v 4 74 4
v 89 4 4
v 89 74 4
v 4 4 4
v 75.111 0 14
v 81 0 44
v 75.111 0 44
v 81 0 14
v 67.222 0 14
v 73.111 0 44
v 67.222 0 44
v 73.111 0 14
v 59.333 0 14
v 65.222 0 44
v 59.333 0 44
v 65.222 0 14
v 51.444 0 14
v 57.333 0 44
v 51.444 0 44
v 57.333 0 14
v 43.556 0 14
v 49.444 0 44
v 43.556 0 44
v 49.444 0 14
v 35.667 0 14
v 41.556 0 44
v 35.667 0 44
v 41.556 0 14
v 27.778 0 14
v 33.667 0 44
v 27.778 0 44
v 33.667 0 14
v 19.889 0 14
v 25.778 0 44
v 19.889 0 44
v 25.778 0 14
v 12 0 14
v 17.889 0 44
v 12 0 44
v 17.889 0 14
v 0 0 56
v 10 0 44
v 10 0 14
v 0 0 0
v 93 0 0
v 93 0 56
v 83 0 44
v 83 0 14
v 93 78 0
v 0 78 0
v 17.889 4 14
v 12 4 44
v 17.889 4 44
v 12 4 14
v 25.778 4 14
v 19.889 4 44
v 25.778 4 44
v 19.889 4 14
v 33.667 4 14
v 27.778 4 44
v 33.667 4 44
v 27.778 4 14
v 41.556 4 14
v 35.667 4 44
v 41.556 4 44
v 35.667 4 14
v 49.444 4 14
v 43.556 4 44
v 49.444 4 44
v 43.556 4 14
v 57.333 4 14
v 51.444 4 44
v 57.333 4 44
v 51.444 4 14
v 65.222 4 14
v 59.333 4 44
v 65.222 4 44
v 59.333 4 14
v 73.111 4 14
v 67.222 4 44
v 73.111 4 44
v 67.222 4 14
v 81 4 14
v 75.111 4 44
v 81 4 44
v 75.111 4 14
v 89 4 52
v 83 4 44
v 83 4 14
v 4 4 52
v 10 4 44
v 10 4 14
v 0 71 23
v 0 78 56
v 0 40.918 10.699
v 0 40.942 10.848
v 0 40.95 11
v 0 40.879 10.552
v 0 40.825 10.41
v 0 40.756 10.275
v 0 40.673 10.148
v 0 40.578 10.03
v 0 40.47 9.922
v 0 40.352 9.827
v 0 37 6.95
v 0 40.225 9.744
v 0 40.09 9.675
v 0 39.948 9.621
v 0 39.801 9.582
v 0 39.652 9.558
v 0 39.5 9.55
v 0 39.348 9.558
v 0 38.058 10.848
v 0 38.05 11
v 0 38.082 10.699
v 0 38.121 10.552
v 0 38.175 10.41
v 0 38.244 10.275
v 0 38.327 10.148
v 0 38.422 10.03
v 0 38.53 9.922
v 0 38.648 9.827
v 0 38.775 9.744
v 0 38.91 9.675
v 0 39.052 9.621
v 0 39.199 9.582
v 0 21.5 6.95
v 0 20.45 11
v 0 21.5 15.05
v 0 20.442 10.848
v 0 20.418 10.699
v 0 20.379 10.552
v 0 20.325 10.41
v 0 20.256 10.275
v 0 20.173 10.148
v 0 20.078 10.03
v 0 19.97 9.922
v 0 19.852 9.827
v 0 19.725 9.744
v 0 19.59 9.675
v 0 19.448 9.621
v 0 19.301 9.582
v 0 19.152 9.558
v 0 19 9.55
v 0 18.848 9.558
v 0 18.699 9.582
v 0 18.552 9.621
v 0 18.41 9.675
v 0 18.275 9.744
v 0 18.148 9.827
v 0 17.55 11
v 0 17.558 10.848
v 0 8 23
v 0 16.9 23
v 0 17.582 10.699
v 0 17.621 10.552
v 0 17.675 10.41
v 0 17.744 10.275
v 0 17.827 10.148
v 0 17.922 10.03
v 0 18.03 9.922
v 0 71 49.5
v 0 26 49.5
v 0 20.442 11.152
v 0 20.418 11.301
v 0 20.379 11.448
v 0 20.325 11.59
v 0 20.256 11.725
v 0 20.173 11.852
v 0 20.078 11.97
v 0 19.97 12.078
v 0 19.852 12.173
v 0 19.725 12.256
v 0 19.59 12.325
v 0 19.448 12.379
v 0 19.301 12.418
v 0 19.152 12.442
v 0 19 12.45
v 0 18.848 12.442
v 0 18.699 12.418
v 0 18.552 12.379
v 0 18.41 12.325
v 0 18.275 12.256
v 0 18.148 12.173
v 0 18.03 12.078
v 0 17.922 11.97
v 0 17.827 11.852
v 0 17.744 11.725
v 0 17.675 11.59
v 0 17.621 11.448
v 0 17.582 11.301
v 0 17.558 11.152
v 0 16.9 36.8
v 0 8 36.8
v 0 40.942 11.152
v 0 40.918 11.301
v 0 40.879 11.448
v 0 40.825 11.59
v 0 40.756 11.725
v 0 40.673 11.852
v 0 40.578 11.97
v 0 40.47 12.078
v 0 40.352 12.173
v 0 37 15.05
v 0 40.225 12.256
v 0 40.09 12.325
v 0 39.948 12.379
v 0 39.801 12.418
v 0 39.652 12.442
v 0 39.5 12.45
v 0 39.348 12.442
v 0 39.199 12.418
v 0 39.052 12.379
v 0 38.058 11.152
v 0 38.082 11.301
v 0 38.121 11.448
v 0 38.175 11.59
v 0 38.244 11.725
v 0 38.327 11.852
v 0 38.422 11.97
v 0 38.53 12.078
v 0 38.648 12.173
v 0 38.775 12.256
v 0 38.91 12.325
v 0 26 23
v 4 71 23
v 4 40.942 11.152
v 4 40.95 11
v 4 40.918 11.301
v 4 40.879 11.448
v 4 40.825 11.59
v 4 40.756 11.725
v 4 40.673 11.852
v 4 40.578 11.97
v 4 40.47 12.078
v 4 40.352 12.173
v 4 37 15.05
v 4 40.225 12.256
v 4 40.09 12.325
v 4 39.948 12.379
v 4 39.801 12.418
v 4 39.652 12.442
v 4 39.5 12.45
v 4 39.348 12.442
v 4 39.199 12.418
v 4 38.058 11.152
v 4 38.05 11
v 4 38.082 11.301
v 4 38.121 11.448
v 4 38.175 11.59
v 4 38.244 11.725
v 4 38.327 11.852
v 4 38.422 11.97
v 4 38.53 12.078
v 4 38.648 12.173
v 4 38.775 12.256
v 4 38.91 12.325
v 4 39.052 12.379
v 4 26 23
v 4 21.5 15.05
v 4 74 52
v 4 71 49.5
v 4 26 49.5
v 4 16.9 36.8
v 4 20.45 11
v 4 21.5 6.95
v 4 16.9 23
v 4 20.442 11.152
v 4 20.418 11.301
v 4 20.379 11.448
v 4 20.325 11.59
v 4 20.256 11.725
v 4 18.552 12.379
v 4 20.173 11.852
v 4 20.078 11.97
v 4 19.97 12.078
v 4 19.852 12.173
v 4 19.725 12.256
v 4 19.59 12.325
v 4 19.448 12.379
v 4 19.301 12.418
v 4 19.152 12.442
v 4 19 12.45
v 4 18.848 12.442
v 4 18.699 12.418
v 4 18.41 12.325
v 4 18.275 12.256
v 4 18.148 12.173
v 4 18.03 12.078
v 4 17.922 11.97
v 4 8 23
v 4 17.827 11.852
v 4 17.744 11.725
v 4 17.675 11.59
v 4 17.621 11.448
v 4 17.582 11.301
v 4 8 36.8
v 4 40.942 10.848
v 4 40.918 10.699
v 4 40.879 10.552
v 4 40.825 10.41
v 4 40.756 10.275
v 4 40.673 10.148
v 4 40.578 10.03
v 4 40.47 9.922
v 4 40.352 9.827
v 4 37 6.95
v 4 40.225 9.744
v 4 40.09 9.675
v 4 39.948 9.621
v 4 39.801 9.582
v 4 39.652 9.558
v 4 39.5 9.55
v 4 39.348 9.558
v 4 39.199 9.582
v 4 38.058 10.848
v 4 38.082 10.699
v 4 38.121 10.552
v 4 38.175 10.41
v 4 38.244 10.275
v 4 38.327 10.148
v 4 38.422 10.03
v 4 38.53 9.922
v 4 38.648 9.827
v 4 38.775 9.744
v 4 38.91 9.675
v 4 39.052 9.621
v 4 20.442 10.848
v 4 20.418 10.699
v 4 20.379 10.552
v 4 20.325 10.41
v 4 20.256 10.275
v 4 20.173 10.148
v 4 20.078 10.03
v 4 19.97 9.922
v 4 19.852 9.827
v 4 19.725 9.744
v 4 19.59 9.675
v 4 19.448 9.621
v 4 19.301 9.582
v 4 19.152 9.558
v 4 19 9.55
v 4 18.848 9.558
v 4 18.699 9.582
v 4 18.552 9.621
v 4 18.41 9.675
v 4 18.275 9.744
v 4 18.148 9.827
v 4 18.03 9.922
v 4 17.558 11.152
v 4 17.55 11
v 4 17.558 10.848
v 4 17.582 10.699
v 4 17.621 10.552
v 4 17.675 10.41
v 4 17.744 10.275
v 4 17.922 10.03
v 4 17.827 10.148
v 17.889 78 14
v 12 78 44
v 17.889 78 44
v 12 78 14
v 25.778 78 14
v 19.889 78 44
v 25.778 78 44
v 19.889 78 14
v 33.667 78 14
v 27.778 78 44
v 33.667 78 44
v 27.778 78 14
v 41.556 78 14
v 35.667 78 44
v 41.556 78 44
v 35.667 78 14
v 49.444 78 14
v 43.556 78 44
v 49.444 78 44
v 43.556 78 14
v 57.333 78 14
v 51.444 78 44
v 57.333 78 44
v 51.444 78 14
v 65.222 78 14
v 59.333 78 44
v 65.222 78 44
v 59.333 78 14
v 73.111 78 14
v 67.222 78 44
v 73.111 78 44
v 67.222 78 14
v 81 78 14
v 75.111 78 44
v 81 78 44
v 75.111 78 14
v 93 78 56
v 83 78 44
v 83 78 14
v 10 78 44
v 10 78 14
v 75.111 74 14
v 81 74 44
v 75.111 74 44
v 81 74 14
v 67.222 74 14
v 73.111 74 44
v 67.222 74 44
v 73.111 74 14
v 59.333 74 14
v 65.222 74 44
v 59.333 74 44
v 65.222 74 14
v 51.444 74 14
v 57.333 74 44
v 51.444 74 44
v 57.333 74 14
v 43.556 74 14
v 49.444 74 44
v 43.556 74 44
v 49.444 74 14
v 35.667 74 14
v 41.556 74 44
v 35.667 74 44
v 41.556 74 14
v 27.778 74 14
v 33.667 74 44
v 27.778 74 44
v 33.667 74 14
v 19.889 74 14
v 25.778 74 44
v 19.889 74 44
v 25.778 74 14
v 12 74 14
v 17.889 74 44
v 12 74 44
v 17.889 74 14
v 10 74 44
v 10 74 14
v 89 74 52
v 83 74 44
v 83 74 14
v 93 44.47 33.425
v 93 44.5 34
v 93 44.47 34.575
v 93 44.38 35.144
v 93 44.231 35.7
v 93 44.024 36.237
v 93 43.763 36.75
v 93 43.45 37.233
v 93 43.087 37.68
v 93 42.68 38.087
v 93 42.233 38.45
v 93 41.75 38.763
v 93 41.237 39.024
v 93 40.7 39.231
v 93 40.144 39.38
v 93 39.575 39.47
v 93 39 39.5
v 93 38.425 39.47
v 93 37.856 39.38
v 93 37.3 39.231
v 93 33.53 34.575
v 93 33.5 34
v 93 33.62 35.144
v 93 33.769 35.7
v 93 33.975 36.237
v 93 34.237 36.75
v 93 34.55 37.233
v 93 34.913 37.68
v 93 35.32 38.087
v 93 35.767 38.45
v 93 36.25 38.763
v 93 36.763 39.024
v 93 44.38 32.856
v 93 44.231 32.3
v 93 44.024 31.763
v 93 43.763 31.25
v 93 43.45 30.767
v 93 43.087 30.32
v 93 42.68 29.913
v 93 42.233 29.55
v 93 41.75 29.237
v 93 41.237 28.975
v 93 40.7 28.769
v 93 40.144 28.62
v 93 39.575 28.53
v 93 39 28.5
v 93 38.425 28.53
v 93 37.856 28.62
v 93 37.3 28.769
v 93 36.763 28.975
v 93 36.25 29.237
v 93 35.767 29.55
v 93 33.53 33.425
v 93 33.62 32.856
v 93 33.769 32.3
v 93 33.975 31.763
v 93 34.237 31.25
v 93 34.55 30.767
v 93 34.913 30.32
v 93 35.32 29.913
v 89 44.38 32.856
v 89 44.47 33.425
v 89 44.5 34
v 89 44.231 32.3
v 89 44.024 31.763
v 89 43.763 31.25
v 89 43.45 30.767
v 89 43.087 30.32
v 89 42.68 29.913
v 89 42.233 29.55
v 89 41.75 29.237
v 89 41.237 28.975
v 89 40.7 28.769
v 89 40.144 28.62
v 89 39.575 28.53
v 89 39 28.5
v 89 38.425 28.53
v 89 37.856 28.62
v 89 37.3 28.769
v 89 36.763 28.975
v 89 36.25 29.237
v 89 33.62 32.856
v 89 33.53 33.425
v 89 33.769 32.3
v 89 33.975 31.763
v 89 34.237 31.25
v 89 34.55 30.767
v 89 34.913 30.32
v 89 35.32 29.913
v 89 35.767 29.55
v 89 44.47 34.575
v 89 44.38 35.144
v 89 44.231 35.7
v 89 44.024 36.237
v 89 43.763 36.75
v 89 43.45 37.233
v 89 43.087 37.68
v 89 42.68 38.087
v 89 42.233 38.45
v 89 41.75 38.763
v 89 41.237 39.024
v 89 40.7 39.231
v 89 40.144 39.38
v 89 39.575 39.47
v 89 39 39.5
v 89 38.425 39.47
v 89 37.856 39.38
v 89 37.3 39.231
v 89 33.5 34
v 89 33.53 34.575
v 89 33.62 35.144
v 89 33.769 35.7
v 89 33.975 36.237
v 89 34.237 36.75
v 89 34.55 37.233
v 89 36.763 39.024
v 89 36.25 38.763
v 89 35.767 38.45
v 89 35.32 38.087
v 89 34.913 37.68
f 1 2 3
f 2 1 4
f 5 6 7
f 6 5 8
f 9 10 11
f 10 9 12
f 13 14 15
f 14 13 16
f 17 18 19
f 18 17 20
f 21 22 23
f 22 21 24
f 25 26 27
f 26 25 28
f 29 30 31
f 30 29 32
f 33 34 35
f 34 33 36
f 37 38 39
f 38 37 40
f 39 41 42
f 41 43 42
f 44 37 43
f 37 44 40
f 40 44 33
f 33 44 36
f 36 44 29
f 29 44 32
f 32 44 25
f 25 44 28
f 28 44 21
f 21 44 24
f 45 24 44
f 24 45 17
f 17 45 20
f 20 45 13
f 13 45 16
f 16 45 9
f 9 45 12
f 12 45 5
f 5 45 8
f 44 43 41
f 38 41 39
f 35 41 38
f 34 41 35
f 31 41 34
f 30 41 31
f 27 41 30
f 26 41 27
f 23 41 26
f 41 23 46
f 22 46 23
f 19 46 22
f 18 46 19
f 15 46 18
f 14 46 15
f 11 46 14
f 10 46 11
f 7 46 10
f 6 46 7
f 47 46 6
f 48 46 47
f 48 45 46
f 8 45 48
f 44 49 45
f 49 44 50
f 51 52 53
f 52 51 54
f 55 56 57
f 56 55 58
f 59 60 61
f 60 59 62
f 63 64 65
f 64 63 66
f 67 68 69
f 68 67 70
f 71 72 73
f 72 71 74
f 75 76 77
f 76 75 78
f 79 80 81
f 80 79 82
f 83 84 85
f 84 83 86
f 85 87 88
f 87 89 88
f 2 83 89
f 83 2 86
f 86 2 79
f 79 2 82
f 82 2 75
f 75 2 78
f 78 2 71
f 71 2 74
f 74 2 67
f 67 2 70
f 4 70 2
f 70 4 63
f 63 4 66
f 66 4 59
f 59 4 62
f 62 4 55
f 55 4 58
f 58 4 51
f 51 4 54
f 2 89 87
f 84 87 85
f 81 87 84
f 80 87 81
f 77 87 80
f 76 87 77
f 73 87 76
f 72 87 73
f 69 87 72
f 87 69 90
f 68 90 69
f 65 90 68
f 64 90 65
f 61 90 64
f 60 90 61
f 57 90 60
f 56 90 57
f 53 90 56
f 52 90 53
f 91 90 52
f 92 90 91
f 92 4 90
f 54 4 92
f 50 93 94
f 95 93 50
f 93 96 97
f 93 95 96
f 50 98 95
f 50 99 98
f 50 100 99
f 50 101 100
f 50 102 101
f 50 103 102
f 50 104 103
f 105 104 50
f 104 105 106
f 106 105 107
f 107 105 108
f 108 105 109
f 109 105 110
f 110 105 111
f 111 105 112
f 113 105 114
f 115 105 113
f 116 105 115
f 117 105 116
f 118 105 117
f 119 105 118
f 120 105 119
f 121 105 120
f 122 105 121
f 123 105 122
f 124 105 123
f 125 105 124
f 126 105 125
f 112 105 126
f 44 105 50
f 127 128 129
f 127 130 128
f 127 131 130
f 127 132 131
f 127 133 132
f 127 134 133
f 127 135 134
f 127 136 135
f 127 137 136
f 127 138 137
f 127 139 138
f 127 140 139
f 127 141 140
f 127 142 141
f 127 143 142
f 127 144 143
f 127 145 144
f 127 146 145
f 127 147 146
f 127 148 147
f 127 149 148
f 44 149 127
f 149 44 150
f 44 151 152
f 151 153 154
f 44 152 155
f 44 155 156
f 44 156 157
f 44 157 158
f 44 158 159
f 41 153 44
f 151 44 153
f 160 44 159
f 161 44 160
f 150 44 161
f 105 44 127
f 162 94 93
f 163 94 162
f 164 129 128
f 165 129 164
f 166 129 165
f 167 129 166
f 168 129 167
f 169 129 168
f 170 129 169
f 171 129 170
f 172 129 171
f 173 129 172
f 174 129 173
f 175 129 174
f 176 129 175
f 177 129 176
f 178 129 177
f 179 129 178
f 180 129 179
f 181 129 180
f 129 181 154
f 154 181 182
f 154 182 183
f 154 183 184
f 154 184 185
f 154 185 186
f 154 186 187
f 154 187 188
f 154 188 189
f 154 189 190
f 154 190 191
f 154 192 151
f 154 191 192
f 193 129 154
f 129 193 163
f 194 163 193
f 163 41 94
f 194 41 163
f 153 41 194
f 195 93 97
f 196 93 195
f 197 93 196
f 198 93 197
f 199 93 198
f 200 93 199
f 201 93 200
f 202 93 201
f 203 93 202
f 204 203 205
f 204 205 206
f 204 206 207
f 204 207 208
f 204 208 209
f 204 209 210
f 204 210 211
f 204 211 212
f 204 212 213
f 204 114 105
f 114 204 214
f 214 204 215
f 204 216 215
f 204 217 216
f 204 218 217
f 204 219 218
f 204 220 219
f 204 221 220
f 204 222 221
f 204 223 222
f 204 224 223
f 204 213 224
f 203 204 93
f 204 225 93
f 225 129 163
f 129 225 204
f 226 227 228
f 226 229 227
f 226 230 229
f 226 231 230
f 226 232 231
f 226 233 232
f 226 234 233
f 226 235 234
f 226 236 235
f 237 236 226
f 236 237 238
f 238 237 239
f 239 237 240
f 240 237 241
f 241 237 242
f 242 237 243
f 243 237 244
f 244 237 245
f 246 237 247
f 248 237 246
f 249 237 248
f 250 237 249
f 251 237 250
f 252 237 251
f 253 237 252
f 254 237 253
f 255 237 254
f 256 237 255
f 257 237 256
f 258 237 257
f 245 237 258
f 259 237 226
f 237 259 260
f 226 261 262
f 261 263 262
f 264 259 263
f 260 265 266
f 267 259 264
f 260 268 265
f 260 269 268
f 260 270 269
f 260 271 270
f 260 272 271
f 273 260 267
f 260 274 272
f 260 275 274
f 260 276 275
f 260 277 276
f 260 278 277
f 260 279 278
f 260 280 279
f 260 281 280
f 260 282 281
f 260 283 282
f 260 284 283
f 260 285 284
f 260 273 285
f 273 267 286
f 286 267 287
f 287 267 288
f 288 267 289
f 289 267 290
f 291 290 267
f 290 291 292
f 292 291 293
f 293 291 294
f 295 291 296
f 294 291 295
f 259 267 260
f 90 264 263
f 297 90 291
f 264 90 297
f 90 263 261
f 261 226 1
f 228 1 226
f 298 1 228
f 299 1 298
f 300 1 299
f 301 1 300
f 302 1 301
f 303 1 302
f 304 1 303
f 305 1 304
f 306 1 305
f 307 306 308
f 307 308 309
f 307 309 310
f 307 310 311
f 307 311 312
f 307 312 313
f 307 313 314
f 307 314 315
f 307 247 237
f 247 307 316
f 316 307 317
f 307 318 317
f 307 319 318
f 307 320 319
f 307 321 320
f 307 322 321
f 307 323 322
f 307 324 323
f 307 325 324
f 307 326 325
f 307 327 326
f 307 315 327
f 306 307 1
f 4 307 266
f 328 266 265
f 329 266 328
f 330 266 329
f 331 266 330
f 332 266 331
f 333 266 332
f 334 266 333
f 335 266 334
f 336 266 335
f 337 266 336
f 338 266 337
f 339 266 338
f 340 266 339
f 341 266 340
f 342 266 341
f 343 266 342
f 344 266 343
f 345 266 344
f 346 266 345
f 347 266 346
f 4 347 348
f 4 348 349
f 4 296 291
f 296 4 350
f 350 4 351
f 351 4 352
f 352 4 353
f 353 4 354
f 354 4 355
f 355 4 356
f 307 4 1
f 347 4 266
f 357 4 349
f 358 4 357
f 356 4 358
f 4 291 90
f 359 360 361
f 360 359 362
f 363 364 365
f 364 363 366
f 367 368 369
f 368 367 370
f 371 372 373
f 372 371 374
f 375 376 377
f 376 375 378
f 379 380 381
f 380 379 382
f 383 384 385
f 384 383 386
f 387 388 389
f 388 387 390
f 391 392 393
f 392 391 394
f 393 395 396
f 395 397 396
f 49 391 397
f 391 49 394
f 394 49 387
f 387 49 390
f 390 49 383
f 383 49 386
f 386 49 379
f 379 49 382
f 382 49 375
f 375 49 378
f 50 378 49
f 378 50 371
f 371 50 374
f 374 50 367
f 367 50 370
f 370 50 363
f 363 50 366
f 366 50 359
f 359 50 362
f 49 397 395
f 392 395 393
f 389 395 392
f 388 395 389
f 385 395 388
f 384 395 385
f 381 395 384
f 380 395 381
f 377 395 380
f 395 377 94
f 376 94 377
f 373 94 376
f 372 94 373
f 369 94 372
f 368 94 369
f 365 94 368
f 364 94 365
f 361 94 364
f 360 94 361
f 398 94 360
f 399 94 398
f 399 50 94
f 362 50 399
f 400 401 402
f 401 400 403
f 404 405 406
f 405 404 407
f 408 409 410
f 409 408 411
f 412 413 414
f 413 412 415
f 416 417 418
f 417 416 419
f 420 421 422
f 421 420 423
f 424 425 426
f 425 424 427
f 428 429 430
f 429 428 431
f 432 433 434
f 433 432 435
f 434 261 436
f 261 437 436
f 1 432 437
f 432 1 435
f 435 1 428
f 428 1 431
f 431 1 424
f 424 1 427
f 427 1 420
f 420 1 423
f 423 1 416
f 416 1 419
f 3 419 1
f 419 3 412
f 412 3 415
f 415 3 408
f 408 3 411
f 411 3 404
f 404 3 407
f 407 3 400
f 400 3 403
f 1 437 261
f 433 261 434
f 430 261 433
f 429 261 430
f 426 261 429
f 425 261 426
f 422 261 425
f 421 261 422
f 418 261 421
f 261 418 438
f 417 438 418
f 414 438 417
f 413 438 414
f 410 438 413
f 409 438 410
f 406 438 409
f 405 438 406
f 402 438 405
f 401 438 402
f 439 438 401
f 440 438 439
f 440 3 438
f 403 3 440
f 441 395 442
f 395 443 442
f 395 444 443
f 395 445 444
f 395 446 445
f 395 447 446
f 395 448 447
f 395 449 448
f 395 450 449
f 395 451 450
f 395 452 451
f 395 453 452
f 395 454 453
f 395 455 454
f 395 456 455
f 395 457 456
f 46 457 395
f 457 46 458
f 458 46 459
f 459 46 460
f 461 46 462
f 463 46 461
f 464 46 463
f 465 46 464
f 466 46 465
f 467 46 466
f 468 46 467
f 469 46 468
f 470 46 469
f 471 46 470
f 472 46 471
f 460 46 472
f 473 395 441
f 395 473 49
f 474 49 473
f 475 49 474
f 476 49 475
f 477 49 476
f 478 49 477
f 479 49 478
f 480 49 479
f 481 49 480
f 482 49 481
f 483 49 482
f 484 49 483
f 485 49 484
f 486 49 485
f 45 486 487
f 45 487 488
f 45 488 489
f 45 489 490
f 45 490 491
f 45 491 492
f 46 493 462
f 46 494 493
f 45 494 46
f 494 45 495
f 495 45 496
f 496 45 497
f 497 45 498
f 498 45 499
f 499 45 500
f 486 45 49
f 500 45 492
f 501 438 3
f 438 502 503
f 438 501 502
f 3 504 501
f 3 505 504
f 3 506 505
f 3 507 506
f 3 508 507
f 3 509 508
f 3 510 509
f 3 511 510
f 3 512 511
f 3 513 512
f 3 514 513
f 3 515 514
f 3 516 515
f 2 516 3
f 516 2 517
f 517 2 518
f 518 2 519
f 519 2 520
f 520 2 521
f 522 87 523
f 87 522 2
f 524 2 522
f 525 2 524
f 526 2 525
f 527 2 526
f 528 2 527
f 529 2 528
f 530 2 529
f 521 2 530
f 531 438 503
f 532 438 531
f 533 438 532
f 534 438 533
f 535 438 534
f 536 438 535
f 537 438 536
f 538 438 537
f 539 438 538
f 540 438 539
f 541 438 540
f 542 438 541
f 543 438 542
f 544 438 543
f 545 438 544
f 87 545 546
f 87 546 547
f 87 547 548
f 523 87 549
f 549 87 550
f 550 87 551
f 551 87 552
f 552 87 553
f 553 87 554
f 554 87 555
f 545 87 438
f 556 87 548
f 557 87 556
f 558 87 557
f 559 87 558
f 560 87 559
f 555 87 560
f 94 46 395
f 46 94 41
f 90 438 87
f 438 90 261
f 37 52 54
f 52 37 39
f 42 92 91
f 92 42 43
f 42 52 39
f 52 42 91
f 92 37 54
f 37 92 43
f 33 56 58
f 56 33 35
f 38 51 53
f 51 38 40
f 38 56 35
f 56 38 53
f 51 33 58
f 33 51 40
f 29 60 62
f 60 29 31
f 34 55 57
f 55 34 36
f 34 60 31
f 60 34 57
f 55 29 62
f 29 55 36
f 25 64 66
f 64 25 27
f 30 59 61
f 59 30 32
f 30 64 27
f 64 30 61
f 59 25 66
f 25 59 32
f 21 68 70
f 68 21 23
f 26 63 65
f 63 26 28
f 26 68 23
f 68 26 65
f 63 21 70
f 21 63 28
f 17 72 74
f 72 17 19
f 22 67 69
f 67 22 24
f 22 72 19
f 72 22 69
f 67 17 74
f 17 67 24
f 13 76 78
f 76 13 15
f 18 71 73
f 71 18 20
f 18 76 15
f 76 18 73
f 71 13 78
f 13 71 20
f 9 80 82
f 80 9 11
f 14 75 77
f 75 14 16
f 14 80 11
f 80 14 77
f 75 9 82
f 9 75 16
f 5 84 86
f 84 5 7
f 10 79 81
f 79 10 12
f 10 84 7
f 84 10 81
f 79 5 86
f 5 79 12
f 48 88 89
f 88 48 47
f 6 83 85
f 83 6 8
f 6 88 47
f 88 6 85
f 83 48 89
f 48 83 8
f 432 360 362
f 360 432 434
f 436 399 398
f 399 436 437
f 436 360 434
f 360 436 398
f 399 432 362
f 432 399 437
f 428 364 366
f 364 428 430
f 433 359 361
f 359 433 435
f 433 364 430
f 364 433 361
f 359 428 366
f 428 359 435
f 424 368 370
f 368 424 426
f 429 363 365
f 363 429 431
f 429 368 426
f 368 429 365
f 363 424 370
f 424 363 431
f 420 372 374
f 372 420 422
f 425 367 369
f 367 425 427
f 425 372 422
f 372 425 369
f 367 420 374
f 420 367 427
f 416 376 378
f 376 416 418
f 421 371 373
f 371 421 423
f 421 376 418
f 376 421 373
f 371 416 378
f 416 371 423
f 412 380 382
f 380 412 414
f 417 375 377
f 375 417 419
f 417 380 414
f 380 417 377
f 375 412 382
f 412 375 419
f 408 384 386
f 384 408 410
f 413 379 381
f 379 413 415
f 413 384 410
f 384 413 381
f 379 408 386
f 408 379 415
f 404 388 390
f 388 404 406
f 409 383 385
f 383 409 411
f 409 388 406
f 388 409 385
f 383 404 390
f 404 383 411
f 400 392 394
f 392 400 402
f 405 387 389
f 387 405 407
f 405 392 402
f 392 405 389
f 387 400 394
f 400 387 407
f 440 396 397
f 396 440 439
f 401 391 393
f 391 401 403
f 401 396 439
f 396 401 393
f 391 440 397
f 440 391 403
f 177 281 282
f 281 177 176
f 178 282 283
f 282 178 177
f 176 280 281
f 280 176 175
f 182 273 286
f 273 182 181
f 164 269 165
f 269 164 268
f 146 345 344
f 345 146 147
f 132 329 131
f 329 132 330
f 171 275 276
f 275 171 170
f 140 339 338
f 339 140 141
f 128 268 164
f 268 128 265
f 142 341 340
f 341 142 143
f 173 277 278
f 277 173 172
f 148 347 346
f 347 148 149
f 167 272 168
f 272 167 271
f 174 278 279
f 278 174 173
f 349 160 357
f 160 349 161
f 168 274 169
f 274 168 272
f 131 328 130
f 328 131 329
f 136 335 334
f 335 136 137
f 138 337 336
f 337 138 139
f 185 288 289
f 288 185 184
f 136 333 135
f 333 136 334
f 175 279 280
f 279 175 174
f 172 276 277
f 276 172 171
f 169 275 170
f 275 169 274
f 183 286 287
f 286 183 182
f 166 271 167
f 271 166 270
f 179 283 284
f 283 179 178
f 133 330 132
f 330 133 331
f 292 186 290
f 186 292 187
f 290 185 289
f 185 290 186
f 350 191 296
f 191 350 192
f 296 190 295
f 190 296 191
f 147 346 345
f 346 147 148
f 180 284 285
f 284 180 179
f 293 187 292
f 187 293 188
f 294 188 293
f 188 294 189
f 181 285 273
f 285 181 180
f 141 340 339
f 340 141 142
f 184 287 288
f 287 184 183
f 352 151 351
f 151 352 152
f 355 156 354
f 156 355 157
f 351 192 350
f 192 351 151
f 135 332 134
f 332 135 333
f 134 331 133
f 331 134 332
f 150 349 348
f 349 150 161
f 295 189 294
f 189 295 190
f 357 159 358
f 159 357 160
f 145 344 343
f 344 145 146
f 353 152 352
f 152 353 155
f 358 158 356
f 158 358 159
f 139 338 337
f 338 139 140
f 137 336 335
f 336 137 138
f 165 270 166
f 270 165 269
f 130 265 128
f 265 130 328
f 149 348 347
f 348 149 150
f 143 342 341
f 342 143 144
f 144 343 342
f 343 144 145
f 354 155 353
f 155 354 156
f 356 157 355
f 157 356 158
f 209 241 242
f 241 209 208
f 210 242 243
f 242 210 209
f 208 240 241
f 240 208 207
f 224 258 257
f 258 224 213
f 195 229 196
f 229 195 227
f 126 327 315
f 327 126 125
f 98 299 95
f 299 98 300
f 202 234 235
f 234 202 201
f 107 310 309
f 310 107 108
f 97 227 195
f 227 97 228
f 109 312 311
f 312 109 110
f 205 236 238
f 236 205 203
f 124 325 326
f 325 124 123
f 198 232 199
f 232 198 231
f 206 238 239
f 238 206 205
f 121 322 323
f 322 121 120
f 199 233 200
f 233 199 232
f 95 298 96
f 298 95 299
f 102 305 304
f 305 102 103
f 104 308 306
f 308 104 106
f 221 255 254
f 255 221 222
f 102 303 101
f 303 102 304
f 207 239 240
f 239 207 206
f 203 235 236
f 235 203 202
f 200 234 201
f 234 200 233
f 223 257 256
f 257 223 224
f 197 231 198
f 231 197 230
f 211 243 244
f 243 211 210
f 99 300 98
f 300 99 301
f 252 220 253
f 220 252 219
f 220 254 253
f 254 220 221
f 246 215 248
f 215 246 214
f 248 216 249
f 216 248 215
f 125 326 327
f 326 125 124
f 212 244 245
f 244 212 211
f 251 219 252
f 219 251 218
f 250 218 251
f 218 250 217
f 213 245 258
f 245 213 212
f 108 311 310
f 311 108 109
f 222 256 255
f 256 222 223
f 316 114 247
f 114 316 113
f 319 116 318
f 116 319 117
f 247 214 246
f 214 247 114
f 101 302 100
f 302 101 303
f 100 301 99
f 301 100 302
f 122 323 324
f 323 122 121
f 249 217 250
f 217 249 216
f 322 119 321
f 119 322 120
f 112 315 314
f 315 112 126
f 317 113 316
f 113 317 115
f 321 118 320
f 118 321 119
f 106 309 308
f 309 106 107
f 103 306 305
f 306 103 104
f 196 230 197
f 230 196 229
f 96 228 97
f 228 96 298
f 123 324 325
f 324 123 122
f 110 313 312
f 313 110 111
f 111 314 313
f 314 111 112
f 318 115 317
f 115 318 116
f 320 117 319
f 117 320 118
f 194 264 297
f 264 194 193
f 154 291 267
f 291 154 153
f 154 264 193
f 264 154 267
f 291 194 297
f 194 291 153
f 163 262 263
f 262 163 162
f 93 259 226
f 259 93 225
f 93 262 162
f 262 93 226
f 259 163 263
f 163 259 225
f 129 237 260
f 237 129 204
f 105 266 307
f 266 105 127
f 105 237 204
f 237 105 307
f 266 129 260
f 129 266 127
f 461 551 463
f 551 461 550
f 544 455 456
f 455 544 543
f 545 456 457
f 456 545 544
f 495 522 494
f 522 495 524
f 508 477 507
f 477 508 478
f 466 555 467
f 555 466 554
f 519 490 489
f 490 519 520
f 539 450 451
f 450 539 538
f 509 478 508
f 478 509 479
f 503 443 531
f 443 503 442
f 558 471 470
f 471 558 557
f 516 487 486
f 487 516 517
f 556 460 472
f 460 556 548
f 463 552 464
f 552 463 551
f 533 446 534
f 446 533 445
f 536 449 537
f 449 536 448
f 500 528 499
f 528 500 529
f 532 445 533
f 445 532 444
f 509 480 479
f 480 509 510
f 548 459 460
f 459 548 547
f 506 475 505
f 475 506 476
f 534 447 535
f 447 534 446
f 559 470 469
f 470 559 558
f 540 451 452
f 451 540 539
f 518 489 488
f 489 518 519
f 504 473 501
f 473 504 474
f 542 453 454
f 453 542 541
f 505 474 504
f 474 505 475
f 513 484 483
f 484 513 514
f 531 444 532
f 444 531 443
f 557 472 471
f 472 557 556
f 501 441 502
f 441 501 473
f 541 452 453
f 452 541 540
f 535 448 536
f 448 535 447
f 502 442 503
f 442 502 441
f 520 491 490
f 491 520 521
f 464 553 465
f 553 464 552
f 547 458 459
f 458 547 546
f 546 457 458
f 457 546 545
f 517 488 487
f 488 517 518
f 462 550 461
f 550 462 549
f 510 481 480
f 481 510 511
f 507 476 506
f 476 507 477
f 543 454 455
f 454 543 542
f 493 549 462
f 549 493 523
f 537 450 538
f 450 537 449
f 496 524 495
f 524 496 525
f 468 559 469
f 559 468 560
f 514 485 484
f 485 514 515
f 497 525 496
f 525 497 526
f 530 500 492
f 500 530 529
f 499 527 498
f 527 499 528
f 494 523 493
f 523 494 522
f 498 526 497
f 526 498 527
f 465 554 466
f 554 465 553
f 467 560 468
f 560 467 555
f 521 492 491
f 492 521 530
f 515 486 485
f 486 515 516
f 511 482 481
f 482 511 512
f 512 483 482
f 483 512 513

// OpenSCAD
include <lasercut.scad>; 

$fn = 60;

// The wood thickness
thickness = 4.0;

X = 85 + 2 * thickness;
Y = 70 + 2 * thickness;
Z = 48 + 2 * thickness;

display_length = 45;
display_height = 26.5;

rocker_l = 13.8;
rocker_w = 8.9;


DC55_21_diam = 11;

cutouts_count = 10;
cutouts_thickness = 2;
cutouts_height = 30;
cutouts_offset = 7;
cutouts_step = (X - 2 * (cutouts_offset + thickness)) / (cutouts_count - 1);

cutouts_vent = [for (i = [0:cutouts_count-1]) [i * cutouts_step + cutouts_offset - cutouts_thickness / 2, 10, cutouts_thickness, cutouts_height]];
DC55_21_hole = [[DC55_21_diam / 2, 10, Y / 2 - thickness]];

M2_5_d = 2.9;

xt60_x0 = 15;
xt60_y0 = 7;


//color("Gold",0.75)
lasercutoutBox(thickness=thickness, x=X, y=Y, z=Z, sides=6, num_fingers=4,
    cutouts_a = [
        [],
        [],
        cutouts_vent,
        cutouts_vent,
        [[19, 4, rocker_l, rocker_w], [19, 22, display_height, display_length], [xt60_y0 - 8.1/2, xt60_x0 + (20.5 - 15.5)/2, 8.1, 15.5]],
        []
    ],
    circles_remove_a = [
        [],
        [],
        [],
        [],
        [[M2_5_d / 2, xt60_y0, xt60_x0], [M2_5_d / 2, xt60_y0, xt60_x0 + 20.5]],
        [[DC55_21_diam / 2, 30, Y / 2 - thickness]],
    ]
);
